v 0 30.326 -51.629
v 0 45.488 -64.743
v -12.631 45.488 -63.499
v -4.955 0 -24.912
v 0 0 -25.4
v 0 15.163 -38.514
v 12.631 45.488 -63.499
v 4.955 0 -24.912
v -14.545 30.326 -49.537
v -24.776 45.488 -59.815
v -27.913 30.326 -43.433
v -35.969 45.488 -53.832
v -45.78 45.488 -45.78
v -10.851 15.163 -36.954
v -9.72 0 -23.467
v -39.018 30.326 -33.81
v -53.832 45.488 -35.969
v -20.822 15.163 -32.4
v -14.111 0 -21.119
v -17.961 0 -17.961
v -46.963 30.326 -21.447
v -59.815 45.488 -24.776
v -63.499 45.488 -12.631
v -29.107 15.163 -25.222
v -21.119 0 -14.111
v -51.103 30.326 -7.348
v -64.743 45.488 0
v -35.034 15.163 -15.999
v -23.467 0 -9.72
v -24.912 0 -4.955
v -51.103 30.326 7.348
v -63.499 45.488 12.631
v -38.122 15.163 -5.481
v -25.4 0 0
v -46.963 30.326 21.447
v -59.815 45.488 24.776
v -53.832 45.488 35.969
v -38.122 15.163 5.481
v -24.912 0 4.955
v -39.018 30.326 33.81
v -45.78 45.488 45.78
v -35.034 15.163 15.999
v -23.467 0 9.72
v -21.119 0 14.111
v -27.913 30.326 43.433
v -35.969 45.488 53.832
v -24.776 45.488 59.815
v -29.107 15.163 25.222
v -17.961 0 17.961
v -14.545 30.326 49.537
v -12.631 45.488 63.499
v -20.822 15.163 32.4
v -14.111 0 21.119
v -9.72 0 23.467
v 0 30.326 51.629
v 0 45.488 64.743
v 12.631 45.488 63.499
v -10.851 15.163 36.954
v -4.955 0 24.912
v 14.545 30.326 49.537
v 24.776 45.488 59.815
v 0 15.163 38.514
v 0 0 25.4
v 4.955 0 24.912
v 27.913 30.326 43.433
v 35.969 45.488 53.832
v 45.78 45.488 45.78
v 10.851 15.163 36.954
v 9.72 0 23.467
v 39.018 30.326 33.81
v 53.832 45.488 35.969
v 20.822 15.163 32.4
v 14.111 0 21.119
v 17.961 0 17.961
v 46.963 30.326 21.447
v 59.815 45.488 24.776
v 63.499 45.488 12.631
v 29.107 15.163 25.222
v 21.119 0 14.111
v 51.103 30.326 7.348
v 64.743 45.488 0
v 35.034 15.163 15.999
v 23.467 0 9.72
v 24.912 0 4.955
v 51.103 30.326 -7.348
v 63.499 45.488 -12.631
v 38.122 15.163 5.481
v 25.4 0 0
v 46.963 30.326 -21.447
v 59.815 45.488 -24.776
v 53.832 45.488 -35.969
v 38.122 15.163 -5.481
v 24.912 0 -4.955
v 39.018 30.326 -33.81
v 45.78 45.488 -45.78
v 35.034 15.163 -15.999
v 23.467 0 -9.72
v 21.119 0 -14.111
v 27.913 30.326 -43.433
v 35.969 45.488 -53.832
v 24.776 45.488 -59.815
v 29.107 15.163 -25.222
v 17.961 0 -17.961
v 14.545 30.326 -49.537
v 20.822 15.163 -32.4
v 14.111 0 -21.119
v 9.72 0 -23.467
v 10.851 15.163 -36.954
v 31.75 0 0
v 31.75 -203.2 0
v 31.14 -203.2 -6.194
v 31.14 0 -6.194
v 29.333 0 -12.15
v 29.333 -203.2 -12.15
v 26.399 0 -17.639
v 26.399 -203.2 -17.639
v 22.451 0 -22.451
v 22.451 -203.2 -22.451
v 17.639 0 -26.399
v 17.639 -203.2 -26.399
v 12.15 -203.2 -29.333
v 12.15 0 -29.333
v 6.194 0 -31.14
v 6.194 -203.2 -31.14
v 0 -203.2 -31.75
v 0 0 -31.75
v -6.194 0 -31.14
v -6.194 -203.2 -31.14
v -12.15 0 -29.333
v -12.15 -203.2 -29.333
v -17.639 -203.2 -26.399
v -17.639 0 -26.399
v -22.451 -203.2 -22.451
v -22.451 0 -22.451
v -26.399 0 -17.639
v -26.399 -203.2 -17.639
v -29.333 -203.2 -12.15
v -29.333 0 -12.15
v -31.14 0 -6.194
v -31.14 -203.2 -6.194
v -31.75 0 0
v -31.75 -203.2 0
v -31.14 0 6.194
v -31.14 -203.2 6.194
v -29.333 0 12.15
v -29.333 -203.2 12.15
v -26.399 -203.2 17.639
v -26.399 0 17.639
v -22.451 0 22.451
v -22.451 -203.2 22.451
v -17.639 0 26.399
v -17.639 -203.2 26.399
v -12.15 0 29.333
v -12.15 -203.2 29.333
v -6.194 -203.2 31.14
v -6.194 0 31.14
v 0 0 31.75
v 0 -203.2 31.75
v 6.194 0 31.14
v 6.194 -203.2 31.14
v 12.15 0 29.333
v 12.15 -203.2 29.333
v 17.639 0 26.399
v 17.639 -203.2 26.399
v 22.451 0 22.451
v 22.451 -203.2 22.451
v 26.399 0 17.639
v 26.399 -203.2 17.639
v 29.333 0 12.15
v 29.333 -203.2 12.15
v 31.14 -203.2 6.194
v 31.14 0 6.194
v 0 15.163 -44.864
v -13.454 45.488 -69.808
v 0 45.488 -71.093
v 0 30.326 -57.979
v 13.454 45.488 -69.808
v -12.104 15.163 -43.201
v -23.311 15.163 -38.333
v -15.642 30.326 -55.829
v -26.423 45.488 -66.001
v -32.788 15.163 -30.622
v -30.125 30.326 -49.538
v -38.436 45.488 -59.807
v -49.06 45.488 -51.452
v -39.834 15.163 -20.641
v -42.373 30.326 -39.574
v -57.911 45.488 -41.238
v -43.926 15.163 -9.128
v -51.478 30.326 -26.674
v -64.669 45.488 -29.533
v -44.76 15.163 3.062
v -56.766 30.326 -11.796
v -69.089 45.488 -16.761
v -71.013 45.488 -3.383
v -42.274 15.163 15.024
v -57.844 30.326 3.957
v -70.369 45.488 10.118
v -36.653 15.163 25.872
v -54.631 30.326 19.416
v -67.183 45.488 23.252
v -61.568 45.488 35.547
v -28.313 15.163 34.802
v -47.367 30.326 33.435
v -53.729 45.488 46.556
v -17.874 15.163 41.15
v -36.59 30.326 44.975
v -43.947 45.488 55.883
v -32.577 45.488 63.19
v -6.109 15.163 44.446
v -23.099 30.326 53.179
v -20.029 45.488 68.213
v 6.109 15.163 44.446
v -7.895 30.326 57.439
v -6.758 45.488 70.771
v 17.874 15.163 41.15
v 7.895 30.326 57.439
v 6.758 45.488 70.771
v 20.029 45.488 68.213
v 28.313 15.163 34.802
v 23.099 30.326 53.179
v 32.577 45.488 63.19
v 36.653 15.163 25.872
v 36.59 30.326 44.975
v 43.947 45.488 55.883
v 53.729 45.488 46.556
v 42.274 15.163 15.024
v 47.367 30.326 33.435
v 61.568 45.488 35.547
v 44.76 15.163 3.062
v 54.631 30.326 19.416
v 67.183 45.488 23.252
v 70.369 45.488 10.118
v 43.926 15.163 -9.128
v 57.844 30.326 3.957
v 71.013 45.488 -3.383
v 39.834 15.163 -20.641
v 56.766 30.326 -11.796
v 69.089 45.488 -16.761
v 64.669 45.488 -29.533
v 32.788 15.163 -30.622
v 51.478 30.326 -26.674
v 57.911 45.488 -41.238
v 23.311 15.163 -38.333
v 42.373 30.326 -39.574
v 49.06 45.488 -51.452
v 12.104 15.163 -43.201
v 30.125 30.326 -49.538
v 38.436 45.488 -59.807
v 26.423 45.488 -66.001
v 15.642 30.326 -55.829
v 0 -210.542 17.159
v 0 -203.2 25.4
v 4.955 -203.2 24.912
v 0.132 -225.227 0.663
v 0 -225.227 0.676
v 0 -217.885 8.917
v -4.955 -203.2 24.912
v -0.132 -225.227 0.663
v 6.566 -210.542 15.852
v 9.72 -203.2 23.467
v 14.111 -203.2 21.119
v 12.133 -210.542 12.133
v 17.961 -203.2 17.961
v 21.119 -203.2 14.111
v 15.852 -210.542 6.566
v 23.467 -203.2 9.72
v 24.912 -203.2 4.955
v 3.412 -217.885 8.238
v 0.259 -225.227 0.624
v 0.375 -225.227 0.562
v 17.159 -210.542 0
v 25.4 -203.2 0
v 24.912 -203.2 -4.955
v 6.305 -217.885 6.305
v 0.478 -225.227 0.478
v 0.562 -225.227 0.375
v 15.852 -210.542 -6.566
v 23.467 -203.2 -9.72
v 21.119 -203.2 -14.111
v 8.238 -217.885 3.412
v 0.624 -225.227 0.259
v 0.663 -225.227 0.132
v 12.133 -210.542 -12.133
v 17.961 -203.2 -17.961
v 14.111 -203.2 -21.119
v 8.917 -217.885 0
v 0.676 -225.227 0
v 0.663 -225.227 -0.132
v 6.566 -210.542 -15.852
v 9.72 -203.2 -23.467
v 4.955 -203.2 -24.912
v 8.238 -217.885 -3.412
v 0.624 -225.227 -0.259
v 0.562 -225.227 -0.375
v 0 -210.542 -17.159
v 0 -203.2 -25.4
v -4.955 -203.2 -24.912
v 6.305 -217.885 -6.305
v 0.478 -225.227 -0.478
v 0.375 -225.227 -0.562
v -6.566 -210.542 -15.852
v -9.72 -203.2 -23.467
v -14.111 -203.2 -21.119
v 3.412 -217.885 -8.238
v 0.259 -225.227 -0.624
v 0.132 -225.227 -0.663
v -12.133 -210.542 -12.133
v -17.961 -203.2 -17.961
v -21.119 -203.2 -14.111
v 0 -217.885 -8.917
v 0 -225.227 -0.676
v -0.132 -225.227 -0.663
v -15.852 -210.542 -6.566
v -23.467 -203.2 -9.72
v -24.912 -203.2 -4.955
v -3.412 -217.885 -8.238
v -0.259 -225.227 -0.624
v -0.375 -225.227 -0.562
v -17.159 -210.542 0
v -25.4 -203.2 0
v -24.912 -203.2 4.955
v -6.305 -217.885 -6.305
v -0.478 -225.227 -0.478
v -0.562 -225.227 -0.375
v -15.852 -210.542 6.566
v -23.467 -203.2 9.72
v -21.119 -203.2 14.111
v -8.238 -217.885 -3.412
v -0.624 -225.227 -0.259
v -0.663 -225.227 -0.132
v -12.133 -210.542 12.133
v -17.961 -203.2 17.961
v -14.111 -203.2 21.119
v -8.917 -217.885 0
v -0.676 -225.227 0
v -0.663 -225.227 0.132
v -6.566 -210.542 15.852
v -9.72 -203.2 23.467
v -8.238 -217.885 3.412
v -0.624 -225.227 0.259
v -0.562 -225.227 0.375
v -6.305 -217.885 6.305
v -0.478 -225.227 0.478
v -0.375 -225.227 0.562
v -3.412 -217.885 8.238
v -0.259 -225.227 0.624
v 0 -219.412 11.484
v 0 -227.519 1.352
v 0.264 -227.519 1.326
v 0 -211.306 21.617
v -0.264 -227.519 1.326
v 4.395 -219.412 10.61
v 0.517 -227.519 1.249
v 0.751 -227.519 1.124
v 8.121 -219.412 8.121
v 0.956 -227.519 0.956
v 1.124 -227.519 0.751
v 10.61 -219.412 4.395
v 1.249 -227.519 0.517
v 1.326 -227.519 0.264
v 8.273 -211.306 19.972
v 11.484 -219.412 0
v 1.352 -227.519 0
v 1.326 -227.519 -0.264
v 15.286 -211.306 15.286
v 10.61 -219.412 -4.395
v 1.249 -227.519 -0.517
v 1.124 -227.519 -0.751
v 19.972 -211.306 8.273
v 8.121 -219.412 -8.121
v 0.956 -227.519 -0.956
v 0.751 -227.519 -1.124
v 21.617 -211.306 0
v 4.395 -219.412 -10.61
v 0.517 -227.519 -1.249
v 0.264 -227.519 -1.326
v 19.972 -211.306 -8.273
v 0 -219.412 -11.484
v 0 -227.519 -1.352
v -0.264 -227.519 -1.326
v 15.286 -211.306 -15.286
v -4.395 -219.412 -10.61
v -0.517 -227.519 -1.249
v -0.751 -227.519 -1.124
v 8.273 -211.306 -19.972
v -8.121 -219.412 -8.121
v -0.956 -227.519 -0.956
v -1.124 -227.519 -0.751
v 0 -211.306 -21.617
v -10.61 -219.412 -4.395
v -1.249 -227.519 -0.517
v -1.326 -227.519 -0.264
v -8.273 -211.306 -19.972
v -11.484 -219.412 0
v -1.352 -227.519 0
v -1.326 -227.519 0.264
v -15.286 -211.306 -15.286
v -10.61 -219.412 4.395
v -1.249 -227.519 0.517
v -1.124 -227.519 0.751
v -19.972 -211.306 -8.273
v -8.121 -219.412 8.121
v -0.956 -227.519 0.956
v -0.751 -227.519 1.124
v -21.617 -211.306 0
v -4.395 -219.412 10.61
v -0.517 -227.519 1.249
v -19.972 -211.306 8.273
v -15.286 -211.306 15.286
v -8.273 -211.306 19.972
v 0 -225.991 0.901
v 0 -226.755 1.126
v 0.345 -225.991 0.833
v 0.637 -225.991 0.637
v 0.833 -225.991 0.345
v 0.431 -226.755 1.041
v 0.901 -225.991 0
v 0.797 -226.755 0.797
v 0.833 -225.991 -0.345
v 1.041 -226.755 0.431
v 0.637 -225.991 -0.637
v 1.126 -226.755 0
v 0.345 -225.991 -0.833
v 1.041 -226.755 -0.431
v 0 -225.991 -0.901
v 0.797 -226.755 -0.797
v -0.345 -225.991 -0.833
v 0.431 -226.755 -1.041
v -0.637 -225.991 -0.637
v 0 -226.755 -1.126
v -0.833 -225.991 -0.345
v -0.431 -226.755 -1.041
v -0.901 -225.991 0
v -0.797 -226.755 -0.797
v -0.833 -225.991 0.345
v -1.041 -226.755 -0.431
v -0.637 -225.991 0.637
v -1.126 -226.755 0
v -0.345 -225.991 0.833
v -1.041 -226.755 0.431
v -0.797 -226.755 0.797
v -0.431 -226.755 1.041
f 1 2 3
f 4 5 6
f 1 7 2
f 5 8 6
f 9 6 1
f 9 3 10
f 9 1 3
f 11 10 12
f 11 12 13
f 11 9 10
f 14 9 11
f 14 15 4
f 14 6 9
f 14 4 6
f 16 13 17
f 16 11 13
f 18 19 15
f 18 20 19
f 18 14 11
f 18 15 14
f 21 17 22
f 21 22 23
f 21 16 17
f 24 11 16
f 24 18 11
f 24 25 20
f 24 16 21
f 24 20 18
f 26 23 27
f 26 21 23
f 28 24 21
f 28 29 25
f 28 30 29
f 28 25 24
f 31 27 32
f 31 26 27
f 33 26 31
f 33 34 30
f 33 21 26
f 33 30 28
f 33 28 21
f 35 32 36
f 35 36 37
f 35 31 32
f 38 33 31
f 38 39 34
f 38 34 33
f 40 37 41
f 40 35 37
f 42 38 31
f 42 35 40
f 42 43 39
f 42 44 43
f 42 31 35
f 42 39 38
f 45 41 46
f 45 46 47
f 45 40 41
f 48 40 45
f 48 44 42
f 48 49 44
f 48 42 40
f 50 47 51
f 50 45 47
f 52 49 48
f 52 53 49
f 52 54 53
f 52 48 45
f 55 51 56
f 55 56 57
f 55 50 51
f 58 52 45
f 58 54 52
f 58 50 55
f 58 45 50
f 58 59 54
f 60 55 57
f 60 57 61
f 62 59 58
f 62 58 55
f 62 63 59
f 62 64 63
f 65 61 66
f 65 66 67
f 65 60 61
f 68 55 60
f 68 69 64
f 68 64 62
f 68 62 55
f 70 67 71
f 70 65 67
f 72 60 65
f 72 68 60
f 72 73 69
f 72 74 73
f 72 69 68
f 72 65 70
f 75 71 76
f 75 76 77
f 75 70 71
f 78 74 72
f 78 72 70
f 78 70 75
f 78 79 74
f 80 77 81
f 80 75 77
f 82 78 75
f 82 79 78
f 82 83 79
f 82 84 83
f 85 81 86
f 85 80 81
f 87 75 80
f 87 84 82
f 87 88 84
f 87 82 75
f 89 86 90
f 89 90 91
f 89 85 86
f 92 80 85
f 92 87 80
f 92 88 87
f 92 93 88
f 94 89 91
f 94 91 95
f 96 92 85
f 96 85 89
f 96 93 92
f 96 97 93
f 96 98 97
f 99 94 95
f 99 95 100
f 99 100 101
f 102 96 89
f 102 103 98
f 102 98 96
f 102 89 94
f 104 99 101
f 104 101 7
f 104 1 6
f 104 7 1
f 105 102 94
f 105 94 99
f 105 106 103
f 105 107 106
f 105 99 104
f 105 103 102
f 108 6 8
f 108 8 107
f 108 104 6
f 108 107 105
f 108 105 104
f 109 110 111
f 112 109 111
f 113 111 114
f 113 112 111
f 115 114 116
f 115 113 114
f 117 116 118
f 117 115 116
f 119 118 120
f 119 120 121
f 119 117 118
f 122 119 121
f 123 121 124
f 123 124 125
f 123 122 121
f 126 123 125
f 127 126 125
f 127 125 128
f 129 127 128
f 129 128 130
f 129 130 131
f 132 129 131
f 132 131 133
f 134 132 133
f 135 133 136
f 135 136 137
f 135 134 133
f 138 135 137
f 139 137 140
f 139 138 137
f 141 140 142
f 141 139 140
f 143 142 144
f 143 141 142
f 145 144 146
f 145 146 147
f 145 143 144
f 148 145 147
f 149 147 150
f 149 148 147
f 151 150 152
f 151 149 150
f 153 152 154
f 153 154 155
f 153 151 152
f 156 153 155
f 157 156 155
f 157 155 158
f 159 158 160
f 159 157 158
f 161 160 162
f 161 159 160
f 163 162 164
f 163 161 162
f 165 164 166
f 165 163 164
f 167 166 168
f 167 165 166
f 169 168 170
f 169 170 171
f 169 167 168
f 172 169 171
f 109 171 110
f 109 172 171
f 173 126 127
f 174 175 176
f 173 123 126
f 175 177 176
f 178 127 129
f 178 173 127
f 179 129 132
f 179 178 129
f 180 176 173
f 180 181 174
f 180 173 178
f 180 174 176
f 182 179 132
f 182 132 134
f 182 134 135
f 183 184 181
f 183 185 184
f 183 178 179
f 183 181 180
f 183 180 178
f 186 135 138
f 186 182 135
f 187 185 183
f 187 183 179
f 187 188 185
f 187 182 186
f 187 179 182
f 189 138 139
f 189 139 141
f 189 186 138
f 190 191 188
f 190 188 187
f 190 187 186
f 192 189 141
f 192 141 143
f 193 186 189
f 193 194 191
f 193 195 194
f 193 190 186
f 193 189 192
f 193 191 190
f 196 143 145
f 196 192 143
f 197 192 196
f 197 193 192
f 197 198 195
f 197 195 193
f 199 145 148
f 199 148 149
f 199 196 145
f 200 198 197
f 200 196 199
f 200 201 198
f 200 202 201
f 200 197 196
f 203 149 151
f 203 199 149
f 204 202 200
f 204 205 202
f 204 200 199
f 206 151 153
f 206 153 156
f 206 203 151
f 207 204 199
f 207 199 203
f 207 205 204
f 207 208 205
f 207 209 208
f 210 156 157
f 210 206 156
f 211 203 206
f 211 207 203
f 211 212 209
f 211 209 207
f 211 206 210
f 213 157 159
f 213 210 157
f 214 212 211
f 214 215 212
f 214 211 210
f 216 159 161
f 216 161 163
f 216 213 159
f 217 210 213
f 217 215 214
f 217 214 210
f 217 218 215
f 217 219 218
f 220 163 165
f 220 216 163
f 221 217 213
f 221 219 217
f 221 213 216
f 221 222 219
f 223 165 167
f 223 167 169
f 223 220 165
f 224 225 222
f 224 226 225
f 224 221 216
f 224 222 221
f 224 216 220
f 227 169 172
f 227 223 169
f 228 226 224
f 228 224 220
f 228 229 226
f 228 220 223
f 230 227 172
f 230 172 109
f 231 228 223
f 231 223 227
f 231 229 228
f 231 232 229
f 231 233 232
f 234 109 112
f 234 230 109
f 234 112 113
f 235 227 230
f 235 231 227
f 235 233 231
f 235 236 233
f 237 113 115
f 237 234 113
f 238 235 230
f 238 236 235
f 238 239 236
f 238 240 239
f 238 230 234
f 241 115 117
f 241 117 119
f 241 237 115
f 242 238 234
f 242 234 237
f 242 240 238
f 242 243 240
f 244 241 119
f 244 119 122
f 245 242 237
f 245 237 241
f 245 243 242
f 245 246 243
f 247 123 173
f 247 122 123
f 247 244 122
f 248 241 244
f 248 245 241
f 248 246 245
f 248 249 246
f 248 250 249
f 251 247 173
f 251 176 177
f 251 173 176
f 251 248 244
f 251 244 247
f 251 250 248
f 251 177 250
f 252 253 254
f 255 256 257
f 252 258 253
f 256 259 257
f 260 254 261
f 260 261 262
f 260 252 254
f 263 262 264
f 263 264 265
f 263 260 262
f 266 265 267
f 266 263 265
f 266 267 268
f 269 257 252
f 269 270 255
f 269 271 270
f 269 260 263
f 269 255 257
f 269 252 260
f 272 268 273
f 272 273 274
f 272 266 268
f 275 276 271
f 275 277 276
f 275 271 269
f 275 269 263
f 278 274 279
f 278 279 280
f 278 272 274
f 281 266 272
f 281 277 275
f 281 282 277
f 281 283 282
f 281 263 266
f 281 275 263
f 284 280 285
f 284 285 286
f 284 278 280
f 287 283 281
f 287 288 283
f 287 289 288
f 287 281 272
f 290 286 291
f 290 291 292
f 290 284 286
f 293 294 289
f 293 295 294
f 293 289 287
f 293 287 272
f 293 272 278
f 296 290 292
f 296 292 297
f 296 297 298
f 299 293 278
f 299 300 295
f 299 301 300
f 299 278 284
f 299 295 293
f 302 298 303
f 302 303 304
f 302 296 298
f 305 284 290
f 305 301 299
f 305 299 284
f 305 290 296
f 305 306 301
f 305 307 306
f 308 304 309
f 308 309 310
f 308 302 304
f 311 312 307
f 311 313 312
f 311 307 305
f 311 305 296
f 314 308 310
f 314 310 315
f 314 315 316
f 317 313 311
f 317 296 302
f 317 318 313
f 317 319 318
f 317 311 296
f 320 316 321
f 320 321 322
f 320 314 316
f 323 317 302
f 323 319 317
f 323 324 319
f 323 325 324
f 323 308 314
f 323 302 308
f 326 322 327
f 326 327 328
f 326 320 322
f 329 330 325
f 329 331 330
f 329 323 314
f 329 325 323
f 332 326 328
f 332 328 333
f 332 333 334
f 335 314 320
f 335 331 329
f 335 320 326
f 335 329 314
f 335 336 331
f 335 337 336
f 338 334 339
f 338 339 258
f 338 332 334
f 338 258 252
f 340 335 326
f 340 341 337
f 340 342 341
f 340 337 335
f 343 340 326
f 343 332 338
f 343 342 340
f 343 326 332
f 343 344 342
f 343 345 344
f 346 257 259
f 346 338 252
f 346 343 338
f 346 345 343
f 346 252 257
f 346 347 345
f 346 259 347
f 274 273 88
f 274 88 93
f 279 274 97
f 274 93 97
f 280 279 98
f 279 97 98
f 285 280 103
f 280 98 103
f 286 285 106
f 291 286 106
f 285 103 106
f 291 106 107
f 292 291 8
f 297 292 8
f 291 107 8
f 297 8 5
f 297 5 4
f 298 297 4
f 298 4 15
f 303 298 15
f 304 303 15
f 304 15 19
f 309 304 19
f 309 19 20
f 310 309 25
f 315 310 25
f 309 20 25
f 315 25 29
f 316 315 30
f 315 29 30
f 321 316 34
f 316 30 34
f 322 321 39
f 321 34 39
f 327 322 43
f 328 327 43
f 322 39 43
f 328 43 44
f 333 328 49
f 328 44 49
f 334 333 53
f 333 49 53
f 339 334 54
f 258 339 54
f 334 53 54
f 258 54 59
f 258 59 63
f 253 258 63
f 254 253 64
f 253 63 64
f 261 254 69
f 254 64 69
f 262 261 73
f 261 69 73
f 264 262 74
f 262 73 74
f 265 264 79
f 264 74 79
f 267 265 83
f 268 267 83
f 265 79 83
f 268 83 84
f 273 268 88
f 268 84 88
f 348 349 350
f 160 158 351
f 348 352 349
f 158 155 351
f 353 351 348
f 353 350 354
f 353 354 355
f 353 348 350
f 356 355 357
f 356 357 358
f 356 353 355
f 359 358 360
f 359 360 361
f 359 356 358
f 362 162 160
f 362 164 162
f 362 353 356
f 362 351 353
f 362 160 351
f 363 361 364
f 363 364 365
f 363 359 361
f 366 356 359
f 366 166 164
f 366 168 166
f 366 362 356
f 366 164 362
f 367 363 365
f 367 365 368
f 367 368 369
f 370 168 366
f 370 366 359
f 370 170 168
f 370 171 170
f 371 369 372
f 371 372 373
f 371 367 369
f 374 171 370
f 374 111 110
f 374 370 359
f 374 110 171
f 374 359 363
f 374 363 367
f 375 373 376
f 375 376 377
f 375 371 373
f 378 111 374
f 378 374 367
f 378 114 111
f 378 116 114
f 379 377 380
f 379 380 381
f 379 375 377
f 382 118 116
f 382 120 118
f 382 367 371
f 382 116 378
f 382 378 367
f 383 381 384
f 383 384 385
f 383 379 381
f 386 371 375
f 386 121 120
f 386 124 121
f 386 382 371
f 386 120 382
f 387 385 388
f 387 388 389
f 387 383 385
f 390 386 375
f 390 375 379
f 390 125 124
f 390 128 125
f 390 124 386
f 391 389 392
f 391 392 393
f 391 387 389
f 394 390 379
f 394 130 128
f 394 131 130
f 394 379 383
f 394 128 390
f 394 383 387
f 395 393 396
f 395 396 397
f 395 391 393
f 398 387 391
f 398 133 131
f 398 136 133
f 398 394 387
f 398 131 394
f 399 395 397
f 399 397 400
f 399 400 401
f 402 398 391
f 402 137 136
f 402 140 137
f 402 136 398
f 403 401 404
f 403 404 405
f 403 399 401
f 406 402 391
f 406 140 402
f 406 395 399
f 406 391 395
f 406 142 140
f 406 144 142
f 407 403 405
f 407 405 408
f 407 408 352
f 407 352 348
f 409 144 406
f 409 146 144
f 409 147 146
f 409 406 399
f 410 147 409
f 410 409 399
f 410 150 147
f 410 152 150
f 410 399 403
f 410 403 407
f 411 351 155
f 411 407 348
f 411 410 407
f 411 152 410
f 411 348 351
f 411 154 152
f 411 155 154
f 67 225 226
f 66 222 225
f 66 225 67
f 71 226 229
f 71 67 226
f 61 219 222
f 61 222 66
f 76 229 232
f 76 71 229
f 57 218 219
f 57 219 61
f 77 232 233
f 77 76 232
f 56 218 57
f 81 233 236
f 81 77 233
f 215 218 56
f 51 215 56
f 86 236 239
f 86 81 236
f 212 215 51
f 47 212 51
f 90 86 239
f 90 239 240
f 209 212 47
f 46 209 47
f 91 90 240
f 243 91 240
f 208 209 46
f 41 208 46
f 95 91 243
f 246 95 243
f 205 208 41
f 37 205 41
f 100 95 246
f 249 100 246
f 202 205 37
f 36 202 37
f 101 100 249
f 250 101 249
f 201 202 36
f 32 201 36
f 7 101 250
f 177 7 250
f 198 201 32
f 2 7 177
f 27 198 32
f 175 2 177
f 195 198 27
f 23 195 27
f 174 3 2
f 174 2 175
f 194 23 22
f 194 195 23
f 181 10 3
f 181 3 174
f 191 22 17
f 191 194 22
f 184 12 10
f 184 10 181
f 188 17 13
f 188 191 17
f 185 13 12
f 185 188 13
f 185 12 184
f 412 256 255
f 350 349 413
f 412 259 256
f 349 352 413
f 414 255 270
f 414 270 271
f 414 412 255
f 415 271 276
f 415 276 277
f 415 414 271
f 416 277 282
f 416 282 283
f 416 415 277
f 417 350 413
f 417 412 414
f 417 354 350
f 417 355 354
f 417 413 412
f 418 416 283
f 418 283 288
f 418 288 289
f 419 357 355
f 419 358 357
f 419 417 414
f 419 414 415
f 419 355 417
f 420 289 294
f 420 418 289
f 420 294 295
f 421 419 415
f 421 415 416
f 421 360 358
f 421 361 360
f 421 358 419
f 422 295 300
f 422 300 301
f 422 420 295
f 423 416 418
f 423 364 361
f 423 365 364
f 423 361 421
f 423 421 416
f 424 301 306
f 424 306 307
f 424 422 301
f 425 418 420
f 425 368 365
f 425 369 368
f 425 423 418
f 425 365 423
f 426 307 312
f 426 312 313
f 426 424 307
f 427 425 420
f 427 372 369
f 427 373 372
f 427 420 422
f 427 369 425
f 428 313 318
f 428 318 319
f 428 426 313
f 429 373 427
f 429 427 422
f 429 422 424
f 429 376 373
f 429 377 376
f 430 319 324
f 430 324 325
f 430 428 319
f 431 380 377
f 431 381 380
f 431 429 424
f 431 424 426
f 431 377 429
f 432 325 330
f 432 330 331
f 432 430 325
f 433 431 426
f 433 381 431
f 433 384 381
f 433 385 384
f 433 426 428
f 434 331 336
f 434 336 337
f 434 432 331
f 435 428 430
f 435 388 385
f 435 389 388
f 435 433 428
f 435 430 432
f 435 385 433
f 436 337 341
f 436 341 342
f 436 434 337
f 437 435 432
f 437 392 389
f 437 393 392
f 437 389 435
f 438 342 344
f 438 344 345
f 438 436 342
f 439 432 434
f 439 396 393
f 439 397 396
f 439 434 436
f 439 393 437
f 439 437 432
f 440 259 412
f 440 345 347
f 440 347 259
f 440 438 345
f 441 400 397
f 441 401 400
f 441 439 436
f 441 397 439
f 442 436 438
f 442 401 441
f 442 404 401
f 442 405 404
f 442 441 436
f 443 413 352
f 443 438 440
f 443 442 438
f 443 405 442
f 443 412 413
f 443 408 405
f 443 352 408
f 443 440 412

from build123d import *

# Parameters (mm, degrees)
SKETCH2_R           = 31.75
SKETCH2_R_2         = 25.4
BOSS_EXTRUDE1_DEPTH = 254
SKETCH5_R           = 46.805948237
CUT_EXTRUDE1_DEPTH  = 50.8


with BuildPart() as part:
    # Sketch2 → Boss-Extrude1 (new body)
    with BuildSketch(Plane(origin=(0, 0, 0), x_dir=(1, 0, 0), z_dir=(0, 1, 0))):
        Circle(SKETCH2_R)
        Circle(SKETCH2_R_2, mode=Mode.SUBTRACT)
    extrude(amount=-BOSS_EXTRUDE1_DEPTH)

    # Sketch4 → Revolve1 (revolve)
    with BuildSketch(Plane(origin=(0, 0, 0), x_dir=(0, 0, -1), z_dir=(1, 0, 0))):
        Polygon((31.75, 0), (71.093054088, 45.488426276), (64.743054088, 45.488426276), (25.4, 0), align=None)
    revolve(axis=Axis((0, 0, 0), (0, 1, 0)))

    # Sketch5 → Cut-Extrude1 (cut)
    with BuildSketch(Plane.XZ.offset(254)):
        Circle(SKETCH5_R)
    extrude(amount=-CUT_EXTRUDE1_DEPTH, mode=Mode.SUBTRACT)

    # Sketch6 → Revolve2 (revolve)
    with BuildSketch(Plane(origin=(0, 0, 0), x_dir=(0, 0, -1), z_dir=(1, 0, 0))):
        Polygon((-31.75, -203.2), (-25.4, -203.2), (-0.675857916, -225.226857467), (-1.351715832, -227.518627335), align=None)
    revolve(axis=Axis((0, -254, 0), (0, 1, 0)))


solid = part.part
